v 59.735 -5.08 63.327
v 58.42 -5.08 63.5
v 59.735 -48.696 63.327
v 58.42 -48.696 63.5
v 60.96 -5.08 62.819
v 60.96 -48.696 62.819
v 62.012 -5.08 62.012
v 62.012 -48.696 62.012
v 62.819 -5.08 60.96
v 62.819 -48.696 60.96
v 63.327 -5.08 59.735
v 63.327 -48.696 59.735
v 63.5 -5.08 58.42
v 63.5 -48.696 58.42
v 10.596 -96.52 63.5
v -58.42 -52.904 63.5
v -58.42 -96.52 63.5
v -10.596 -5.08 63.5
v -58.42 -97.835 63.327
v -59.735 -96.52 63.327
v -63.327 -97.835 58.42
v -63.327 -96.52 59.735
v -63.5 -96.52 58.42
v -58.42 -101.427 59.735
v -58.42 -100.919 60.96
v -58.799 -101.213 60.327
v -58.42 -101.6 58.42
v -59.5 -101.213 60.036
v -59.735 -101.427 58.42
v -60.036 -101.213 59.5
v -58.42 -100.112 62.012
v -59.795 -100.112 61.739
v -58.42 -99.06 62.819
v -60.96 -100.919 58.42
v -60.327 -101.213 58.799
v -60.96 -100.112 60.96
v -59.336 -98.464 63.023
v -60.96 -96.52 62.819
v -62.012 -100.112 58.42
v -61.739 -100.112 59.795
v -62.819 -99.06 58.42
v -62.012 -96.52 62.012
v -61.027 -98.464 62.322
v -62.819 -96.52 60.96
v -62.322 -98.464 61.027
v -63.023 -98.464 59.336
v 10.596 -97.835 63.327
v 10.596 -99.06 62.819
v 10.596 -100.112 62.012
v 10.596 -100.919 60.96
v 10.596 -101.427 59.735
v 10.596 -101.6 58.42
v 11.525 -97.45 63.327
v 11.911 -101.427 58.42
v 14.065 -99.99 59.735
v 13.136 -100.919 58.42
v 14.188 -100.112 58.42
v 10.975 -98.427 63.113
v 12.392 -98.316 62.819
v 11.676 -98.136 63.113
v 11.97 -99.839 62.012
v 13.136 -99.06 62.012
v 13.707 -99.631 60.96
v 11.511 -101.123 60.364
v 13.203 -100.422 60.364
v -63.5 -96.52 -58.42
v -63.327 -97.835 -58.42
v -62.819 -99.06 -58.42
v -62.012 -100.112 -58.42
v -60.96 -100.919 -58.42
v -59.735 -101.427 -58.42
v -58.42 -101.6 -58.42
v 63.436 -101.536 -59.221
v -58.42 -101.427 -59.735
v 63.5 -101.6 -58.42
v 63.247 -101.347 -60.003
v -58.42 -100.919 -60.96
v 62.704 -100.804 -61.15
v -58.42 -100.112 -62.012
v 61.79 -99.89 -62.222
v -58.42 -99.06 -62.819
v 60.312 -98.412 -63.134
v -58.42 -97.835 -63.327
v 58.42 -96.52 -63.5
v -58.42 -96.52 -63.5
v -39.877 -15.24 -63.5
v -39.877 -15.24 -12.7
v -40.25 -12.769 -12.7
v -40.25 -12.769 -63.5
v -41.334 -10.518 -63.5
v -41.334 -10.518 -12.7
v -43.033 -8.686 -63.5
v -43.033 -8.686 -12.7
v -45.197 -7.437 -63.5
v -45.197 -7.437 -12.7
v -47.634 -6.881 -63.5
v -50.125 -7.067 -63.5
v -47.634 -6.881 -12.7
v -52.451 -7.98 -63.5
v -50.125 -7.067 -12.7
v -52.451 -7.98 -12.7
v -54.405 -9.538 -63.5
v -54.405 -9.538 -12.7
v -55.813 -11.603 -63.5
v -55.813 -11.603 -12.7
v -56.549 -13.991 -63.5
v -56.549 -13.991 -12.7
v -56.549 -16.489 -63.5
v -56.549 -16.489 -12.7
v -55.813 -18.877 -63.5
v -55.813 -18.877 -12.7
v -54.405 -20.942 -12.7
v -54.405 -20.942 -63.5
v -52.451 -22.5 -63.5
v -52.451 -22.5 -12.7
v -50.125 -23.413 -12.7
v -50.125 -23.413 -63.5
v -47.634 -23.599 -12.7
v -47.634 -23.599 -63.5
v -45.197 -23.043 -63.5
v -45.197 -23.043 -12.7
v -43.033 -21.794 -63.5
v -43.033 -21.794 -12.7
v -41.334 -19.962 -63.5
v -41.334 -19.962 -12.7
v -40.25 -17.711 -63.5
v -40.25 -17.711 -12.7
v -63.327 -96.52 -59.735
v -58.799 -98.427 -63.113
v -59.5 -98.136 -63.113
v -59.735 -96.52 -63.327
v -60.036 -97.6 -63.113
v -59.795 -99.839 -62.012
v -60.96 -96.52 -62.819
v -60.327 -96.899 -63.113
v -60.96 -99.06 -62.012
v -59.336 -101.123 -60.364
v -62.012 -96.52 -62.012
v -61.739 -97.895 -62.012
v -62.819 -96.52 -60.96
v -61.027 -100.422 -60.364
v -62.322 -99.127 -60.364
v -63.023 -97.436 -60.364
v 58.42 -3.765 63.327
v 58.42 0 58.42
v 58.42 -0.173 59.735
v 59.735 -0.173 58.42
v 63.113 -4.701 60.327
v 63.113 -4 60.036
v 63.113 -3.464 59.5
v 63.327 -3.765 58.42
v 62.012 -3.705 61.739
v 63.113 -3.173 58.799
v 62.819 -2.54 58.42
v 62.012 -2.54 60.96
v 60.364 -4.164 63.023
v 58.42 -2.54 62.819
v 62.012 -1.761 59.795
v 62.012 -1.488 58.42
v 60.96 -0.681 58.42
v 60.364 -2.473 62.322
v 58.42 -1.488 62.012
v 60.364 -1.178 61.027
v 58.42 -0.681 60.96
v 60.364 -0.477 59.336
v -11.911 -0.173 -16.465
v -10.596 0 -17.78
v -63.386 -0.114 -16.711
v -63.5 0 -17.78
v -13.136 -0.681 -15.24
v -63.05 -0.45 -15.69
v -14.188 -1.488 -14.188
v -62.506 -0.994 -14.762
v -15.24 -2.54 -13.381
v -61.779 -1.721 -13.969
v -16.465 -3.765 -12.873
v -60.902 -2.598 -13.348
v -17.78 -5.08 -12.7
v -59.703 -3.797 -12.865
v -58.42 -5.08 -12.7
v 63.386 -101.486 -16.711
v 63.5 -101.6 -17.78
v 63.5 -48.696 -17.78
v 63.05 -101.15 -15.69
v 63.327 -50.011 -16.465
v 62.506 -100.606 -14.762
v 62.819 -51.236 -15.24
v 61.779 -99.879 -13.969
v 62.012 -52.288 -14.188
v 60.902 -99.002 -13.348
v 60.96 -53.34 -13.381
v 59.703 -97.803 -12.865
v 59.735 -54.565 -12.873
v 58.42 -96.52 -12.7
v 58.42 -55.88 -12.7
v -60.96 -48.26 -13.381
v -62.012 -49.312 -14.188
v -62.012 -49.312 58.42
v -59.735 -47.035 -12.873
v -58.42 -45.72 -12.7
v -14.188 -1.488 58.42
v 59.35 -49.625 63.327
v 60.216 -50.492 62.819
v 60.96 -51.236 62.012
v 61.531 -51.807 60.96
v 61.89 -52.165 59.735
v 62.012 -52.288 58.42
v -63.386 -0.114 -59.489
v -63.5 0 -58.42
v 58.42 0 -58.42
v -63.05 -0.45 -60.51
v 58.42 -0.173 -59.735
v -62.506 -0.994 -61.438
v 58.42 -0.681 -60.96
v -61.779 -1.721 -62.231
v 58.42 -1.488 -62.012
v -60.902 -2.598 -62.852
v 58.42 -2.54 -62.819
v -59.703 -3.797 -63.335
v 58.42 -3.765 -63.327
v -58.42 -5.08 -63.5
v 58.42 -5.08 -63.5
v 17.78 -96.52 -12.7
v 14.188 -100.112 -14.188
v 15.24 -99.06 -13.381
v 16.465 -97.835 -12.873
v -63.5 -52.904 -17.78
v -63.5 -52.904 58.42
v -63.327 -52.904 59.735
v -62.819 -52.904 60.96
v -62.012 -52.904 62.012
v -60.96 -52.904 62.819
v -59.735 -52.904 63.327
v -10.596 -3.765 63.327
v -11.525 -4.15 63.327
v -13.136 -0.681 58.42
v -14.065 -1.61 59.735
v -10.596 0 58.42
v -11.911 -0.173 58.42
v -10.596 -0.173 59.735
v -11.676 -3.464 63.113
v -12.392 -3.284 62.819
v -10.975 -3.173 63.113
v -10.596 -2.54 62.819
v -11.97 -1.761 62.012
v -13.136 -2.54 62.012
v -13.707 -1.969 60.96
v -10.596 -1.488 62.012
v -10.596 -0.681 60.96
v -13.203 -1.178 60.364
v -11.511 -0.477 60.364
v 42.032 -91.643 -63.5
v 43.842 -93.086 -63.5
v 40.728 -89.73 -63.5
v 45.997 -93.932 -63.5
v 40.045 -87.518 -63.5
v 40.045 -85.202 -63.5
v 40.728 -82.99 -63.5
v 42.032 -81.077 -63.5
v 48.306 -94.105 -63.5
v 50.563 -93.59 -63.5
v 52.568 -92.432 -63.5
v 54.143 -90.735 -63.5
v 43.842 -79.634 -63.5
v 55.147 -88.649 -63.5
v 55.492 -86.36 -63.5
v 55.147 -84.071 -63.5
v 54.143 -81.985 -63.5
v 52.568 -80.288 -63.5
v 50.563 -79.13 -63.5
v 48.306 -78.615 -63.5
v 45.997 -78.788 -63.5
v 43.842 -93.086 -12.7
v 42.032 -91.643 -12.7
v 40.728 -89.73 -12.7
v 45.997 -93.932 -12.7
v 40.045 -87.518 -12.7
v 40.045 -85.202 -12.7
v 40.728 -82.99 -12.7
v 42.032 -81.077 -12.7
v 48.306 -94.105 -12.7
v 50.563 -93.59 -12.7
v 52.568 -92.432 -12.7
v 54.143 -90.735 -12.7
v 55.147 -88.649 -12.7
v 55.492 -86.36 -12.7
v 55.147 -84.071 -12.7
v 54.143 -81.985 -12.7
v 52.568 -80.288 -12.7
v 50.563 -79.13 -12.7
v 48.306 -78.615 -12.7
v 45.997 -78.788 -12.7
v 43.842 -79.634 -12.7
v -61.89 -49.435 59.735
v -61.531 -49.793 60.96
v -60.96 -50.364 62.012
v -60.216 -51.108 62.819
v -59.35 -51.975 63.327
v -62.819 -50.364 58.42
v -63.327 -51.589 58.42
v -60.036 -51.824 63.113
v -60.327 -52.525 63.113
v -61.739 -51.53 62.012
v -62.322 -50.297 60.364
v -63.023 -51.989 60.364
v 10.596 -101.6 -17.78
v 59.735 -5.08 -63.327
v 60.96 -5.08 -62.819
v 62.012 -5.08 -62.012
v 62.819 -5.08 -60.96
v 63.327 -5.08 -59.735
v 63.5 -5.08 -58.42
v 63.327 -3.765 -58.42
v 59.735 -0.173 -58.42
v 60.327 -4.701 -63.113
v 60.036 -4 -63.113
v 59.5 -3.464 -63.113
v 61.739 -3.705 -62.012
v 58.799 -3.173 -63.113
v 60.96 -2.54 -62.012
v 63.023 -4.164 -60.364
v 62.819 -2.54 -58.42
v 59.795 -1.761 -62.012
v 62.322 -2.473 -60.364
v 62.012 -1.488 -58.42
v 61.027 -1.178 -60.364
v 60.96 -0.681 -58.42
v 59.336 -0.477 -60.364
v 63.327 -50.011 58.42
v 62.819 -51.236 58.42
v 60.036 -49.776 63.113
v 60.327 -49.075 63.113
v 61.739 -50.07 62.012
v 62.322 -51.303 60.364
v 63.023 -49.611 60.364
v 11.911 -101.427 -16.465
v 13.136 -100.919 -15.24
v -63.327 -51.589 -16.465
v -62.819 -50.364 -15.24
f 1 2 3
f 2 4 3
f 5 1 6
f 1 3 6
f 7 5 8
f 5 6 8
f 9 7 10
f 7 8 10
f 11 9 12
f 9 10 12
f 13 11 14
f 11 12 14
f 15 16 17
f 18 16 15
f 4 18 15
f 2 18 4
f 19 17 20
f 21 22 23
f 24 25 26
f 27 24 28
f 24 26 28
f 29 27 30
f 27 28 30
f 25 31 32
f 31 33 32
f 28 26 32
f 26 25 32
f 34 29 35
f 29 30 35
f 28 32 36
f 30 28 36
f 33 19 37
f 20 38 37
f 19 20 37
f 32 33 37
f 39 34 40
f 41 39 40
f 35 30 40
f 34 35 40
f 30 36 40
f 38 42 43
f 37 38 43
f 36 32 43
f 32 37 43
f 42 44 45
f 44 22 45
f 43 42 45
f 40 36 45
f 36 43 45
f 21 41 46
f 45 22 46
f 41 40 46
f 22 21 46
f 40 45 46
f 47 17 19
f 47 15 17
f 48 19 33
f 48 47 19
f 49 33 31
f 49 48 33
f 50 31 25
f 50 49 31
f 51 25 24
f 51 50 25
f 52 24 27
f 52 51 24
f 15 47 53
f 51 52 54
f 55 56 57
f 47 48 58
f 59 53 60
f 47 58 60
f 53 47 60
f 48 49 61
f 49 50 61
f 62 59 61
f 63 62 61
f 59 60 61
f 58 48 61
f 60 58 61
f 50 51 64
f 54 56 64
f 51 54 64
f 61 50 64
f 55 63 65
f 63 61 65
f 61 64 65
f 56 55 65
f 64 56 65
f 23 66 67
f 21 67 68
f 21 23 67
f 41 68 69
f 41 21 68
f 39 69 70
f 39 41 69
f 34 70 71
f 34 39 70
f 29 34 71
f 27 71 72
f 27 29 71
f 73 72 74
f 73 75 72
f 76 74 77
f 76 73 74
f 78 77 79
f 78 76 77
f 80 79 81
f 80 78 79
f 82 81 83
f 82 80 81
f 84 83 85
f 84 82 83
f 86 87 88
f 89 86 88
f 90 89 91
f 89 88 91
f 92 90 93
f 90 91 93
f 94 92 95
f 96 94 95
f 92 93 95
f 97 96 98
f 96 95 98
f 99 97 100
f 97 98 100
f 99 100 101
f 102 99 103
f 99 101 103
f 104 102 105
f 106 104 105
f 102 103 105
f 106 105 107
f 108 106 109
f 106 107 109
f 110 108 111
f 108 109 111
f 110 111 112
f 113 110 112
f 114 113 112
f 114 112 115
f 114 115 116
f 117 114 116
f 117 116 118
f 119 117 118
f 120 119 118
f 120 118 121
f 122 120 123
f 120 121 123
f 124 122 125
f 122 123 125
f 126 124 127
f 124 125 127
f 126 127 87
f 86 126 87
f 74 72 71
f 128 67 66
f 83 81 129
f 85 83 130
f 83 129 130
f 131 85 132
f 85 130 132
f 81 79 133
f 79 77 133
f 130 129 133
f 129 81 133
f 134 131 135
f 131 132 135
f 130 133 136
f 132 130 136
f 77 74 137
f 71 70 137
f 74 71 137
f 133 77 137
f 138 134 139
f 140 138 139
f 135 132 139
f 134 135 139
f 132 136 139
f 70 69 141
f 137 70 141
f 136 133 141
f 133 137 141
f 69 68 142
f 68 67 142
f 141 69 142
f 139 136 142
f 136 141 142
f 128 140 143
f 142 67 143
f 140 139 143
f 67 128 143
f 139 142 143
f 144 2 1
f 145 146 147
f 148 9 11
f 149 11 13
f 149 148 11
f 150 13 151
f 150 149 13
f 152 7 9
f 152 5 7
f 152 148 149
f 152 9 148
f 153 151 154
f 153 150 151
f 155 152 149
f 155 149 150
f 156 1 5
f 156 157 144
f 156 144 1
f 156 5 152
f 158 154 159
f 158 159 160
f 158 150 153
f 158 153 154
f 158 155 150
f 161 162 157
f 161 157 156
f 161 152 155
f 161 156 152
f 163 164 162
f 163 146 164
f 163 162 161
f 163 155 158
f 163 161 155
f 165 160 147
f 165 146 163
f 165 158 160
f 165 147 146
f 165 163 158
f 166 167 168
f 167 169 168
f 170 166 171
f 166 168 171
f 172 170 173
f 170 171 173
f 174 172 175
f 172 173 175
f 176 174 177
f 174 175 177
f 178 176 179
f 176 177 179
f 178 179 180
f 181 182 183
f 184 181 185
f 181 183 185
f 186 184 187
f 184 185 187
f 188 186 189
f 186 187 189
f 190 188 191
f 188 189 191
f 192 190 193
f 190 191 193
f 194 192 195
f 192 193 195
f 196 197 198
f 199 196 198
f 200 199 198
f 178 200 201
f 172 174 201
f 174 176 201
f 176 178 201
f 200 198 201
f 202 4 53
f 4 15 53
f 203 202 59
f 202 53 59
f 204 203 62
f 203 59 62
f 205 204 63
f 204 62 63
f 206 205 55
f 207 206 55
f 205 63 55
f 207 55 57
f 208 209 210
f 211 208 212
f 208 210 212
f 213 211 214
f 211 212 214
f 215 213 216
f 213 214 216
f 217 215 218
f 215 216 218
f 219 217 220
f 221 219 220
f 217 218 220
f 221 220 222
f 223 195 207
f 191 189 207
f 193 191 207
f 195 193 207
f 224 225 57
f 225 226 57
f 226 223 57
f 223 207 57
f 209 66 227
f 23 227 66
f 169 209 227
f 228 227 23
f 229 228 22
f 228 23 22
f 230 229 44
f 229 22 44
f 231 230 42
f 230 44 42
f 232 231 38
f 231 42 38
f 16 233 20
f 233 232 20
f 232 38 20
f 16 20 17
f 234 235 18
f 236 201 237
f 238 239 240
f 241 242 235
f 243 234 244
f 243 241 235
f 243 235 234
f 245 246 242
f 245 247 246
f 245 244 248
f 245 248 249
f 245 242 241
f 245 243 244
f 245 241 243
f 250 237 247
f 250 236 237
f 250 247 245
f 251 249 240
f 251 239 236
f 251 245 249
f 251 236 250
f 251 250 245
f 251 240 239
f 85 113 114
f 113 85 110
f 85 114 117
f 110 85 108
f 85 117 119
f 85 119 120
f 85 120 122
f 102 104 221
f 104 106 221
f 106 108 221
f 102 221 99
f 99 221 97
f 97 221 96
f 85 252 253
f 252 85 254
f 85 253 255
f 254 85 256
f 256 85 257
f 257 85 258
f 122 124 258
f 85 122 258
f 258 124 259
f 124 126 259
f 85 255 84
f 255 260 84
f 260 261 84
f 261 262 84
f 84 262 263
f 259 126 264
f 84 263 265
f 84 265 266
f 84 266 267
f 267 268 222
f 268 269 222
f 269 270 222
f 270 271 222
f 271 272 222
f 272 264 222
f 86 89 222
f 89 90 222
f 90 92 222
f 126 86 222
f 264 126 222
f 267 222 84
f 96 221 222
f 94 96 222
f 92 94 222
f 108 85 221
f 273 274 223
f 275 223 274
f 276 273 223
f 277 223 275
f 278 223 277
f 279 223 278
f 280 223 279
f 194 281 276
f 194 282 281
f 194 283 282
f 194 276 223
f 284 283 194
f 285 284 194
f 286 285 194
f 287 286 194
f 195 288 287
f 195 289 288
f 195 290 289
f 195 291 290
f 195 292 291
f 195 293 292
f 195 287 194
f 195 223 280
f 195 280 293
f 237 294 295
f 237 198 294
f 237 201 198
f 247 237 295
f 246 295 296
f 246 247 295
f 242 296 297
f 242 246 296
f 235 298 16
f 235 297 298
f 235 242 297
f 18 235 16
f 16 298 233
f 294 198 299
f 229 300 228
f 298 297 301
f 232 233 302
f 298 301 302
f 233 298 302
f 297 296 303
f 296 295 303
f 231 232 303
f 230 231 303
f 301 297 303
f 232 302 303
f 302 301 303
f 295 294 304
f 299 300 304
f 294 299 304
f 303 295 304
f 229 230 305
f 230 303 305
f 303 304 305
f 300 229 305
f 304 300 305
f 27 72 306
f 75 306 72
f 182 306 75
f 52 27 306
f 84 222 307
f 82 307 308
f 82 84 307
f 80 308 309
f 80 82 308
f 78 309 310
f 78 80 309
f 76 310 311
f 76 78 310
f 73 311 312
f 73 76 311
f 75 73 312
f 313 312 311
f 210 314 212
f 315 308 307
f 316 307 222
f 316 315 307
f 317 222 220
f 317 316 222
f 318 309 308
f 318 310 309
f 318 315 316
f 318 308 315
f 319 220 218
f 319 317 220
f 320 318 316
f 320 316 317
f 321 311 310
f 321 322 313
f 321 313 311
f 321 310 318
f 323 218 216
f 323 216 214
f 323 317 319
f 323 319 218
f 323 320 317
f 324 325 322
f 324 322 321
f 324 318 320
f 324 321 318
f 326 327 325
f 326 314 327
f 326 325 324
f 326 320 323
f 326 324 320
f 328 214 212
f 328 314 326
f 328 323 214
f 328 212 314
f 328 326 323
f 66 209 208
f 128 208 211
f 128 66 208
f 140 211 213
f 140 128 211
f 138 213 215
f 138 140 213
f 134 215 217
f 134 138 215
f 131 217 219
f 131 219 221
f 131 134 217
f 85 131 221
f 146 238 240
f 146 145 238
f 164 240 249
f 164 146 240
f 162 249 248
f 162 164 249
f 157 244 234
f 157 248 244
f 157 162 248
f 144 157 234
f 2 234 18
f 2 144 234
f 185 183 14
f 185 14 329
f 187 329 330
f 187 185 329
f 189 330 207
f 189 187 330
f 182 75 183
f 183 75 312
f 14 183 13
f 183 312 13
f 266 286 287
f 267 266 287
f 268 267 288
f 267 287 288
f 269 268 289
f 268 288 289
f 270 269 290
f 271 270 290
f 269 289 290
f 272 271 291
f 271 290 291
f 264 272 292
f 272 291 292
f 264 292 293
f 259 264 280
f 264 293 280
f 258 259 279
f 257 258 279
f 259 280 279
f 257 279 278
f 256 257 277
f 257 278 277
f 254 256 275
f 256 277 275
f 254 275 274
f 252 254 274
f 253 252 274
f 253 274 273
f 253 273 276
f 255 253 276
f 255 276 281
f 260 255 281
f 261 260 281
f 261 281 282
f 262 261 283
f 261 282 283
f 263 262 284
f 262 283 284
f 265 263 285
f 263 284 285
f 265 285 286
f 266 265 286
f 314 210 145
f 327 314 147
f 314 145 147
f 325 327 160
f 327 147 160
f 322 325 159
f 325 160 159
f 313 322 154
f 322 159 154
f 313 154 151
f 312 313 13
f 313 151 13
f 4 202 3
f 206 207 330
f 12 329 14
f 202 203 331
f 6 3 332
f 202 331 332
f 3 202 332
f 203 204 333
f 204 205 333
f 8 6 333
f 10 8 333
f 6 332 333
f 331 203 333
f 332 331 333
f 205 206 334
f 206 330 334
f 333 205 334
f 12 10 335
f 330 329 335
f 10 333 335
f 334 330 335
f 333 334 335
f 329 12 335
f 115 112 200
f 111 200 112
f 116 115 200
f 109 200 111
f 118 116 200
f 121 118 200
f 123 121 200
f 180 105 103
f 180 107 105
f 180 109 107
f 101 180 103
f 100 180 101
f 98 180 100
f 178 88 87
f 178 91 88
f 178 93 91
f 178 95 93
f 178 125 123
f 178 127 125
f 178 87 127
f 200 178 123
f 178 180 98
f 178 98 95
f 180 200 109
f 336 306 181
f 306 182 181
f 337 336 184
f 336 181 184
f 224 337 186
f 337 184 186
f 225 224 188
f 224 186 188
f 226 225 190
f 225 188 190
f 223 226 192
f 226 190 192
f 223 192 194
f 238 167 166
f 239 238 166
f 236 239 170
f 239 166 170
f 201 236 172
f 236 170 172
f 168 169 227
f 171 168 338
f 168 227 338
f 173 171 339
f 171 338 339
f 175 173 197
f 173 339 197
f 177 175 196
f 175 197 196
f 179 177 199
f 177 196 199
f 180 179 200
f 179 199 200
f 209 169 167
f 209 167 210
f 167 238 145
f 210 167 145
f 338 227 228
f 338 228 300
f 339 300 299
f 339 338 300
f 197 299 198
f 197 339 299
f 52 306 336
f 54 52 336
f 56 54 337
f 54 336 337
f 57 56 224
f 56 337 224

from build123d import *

# Parameters (mm, degrees)
F0_W     = 127
F0_H     = 127
F1_DEPTH = 101.6
F3_DEPTH = 76.2
F5_DEPTH = 76.2
F7_R     = 8.382674823
F8_DEPTH = 50.8
F6_R     = 7.7668100233
F9_DEPTH = 50.8
F10_R    = 5.08


with BuildPart() as f1:
    # F0 (on Front) → F1 (new body)
    with BuildSketch(Plane.XZ):
        Rectangle(F0_W, F0_H)
    extrude(amount=F1_DEPTH)

    # F2 (on face) → F3 (cut)
    with BuildSketch(Plane.XY.offset(63.5)):
        Polygon((-12.7, 0), (-63.5, 0), (-63.5, -50.8), align=None)
    extrude(amount=-F3_DEPTH, mode=Mode.SUBTRACT)

    # F4 (on face) → F5 (cut)
    with BuildSketch(Plane.XY.offset(63.5)):
        Polygon((12.7, -101.6), (63.5, -101.6), (63.5, -50.8), align=None)
    extrude(amount=-F5_DEPTH, mode=Mode.SUBTRACT)

    # F7 (on face) → F8 (cut)
    with BuildSketch(Plane.XY.offset(-12.7)):
        with Locations((-48.26, -15.24)):
            Circle(F7_R)
    extrude(amount=-F8_DEPTH, mode=Mode.SUBTRACT)

    # F6 (on face) → F9 (cut)
    with BuildSketch(Plane.XY.offset(-12.7)):
        with Locations((47.7252677083, -86.36)):
            Circle(F6_R)
    extrude(amount=-F9_DEPTH, mode=Mode.SUBTRACT)

    # F10
    f10_edges = [f1.edges().sort_by_distance(p)[0] for p in [
        (-38.1, -25.4, 63.5),
        (-63.5, -76.2, 63.5),
        (-25.4, -101.6, 63.5),
        (38.1, -76.2, 63.5),
        (25.4, 0, 63.5),
        (63.5, -25.4, 63.5),
        (63.5, -50.8, 25.4),
        (63.5, 0, 0),
        (63.5, -50.8, -63.5),
        (63.5, -76.2, -12.7),
        (38.1, -101.6, -12.7),
        (12.7, -101.6, 25.4),
        (-63.5, -101.6, 0),
        (0, -101.6, -63.5),
        (-63.5, -50.8, -63.5),
        (-63.5, -50.8, 25.4),
        (-63.5, -25.4, -12.7),
        (0, 0, -63.5),
        (-38.1, 0, -12.7),
        (-12.7, 0, 25.4),
    ]]
    fillet(f10_edges, radius=F10_R)


solid = f1.part
